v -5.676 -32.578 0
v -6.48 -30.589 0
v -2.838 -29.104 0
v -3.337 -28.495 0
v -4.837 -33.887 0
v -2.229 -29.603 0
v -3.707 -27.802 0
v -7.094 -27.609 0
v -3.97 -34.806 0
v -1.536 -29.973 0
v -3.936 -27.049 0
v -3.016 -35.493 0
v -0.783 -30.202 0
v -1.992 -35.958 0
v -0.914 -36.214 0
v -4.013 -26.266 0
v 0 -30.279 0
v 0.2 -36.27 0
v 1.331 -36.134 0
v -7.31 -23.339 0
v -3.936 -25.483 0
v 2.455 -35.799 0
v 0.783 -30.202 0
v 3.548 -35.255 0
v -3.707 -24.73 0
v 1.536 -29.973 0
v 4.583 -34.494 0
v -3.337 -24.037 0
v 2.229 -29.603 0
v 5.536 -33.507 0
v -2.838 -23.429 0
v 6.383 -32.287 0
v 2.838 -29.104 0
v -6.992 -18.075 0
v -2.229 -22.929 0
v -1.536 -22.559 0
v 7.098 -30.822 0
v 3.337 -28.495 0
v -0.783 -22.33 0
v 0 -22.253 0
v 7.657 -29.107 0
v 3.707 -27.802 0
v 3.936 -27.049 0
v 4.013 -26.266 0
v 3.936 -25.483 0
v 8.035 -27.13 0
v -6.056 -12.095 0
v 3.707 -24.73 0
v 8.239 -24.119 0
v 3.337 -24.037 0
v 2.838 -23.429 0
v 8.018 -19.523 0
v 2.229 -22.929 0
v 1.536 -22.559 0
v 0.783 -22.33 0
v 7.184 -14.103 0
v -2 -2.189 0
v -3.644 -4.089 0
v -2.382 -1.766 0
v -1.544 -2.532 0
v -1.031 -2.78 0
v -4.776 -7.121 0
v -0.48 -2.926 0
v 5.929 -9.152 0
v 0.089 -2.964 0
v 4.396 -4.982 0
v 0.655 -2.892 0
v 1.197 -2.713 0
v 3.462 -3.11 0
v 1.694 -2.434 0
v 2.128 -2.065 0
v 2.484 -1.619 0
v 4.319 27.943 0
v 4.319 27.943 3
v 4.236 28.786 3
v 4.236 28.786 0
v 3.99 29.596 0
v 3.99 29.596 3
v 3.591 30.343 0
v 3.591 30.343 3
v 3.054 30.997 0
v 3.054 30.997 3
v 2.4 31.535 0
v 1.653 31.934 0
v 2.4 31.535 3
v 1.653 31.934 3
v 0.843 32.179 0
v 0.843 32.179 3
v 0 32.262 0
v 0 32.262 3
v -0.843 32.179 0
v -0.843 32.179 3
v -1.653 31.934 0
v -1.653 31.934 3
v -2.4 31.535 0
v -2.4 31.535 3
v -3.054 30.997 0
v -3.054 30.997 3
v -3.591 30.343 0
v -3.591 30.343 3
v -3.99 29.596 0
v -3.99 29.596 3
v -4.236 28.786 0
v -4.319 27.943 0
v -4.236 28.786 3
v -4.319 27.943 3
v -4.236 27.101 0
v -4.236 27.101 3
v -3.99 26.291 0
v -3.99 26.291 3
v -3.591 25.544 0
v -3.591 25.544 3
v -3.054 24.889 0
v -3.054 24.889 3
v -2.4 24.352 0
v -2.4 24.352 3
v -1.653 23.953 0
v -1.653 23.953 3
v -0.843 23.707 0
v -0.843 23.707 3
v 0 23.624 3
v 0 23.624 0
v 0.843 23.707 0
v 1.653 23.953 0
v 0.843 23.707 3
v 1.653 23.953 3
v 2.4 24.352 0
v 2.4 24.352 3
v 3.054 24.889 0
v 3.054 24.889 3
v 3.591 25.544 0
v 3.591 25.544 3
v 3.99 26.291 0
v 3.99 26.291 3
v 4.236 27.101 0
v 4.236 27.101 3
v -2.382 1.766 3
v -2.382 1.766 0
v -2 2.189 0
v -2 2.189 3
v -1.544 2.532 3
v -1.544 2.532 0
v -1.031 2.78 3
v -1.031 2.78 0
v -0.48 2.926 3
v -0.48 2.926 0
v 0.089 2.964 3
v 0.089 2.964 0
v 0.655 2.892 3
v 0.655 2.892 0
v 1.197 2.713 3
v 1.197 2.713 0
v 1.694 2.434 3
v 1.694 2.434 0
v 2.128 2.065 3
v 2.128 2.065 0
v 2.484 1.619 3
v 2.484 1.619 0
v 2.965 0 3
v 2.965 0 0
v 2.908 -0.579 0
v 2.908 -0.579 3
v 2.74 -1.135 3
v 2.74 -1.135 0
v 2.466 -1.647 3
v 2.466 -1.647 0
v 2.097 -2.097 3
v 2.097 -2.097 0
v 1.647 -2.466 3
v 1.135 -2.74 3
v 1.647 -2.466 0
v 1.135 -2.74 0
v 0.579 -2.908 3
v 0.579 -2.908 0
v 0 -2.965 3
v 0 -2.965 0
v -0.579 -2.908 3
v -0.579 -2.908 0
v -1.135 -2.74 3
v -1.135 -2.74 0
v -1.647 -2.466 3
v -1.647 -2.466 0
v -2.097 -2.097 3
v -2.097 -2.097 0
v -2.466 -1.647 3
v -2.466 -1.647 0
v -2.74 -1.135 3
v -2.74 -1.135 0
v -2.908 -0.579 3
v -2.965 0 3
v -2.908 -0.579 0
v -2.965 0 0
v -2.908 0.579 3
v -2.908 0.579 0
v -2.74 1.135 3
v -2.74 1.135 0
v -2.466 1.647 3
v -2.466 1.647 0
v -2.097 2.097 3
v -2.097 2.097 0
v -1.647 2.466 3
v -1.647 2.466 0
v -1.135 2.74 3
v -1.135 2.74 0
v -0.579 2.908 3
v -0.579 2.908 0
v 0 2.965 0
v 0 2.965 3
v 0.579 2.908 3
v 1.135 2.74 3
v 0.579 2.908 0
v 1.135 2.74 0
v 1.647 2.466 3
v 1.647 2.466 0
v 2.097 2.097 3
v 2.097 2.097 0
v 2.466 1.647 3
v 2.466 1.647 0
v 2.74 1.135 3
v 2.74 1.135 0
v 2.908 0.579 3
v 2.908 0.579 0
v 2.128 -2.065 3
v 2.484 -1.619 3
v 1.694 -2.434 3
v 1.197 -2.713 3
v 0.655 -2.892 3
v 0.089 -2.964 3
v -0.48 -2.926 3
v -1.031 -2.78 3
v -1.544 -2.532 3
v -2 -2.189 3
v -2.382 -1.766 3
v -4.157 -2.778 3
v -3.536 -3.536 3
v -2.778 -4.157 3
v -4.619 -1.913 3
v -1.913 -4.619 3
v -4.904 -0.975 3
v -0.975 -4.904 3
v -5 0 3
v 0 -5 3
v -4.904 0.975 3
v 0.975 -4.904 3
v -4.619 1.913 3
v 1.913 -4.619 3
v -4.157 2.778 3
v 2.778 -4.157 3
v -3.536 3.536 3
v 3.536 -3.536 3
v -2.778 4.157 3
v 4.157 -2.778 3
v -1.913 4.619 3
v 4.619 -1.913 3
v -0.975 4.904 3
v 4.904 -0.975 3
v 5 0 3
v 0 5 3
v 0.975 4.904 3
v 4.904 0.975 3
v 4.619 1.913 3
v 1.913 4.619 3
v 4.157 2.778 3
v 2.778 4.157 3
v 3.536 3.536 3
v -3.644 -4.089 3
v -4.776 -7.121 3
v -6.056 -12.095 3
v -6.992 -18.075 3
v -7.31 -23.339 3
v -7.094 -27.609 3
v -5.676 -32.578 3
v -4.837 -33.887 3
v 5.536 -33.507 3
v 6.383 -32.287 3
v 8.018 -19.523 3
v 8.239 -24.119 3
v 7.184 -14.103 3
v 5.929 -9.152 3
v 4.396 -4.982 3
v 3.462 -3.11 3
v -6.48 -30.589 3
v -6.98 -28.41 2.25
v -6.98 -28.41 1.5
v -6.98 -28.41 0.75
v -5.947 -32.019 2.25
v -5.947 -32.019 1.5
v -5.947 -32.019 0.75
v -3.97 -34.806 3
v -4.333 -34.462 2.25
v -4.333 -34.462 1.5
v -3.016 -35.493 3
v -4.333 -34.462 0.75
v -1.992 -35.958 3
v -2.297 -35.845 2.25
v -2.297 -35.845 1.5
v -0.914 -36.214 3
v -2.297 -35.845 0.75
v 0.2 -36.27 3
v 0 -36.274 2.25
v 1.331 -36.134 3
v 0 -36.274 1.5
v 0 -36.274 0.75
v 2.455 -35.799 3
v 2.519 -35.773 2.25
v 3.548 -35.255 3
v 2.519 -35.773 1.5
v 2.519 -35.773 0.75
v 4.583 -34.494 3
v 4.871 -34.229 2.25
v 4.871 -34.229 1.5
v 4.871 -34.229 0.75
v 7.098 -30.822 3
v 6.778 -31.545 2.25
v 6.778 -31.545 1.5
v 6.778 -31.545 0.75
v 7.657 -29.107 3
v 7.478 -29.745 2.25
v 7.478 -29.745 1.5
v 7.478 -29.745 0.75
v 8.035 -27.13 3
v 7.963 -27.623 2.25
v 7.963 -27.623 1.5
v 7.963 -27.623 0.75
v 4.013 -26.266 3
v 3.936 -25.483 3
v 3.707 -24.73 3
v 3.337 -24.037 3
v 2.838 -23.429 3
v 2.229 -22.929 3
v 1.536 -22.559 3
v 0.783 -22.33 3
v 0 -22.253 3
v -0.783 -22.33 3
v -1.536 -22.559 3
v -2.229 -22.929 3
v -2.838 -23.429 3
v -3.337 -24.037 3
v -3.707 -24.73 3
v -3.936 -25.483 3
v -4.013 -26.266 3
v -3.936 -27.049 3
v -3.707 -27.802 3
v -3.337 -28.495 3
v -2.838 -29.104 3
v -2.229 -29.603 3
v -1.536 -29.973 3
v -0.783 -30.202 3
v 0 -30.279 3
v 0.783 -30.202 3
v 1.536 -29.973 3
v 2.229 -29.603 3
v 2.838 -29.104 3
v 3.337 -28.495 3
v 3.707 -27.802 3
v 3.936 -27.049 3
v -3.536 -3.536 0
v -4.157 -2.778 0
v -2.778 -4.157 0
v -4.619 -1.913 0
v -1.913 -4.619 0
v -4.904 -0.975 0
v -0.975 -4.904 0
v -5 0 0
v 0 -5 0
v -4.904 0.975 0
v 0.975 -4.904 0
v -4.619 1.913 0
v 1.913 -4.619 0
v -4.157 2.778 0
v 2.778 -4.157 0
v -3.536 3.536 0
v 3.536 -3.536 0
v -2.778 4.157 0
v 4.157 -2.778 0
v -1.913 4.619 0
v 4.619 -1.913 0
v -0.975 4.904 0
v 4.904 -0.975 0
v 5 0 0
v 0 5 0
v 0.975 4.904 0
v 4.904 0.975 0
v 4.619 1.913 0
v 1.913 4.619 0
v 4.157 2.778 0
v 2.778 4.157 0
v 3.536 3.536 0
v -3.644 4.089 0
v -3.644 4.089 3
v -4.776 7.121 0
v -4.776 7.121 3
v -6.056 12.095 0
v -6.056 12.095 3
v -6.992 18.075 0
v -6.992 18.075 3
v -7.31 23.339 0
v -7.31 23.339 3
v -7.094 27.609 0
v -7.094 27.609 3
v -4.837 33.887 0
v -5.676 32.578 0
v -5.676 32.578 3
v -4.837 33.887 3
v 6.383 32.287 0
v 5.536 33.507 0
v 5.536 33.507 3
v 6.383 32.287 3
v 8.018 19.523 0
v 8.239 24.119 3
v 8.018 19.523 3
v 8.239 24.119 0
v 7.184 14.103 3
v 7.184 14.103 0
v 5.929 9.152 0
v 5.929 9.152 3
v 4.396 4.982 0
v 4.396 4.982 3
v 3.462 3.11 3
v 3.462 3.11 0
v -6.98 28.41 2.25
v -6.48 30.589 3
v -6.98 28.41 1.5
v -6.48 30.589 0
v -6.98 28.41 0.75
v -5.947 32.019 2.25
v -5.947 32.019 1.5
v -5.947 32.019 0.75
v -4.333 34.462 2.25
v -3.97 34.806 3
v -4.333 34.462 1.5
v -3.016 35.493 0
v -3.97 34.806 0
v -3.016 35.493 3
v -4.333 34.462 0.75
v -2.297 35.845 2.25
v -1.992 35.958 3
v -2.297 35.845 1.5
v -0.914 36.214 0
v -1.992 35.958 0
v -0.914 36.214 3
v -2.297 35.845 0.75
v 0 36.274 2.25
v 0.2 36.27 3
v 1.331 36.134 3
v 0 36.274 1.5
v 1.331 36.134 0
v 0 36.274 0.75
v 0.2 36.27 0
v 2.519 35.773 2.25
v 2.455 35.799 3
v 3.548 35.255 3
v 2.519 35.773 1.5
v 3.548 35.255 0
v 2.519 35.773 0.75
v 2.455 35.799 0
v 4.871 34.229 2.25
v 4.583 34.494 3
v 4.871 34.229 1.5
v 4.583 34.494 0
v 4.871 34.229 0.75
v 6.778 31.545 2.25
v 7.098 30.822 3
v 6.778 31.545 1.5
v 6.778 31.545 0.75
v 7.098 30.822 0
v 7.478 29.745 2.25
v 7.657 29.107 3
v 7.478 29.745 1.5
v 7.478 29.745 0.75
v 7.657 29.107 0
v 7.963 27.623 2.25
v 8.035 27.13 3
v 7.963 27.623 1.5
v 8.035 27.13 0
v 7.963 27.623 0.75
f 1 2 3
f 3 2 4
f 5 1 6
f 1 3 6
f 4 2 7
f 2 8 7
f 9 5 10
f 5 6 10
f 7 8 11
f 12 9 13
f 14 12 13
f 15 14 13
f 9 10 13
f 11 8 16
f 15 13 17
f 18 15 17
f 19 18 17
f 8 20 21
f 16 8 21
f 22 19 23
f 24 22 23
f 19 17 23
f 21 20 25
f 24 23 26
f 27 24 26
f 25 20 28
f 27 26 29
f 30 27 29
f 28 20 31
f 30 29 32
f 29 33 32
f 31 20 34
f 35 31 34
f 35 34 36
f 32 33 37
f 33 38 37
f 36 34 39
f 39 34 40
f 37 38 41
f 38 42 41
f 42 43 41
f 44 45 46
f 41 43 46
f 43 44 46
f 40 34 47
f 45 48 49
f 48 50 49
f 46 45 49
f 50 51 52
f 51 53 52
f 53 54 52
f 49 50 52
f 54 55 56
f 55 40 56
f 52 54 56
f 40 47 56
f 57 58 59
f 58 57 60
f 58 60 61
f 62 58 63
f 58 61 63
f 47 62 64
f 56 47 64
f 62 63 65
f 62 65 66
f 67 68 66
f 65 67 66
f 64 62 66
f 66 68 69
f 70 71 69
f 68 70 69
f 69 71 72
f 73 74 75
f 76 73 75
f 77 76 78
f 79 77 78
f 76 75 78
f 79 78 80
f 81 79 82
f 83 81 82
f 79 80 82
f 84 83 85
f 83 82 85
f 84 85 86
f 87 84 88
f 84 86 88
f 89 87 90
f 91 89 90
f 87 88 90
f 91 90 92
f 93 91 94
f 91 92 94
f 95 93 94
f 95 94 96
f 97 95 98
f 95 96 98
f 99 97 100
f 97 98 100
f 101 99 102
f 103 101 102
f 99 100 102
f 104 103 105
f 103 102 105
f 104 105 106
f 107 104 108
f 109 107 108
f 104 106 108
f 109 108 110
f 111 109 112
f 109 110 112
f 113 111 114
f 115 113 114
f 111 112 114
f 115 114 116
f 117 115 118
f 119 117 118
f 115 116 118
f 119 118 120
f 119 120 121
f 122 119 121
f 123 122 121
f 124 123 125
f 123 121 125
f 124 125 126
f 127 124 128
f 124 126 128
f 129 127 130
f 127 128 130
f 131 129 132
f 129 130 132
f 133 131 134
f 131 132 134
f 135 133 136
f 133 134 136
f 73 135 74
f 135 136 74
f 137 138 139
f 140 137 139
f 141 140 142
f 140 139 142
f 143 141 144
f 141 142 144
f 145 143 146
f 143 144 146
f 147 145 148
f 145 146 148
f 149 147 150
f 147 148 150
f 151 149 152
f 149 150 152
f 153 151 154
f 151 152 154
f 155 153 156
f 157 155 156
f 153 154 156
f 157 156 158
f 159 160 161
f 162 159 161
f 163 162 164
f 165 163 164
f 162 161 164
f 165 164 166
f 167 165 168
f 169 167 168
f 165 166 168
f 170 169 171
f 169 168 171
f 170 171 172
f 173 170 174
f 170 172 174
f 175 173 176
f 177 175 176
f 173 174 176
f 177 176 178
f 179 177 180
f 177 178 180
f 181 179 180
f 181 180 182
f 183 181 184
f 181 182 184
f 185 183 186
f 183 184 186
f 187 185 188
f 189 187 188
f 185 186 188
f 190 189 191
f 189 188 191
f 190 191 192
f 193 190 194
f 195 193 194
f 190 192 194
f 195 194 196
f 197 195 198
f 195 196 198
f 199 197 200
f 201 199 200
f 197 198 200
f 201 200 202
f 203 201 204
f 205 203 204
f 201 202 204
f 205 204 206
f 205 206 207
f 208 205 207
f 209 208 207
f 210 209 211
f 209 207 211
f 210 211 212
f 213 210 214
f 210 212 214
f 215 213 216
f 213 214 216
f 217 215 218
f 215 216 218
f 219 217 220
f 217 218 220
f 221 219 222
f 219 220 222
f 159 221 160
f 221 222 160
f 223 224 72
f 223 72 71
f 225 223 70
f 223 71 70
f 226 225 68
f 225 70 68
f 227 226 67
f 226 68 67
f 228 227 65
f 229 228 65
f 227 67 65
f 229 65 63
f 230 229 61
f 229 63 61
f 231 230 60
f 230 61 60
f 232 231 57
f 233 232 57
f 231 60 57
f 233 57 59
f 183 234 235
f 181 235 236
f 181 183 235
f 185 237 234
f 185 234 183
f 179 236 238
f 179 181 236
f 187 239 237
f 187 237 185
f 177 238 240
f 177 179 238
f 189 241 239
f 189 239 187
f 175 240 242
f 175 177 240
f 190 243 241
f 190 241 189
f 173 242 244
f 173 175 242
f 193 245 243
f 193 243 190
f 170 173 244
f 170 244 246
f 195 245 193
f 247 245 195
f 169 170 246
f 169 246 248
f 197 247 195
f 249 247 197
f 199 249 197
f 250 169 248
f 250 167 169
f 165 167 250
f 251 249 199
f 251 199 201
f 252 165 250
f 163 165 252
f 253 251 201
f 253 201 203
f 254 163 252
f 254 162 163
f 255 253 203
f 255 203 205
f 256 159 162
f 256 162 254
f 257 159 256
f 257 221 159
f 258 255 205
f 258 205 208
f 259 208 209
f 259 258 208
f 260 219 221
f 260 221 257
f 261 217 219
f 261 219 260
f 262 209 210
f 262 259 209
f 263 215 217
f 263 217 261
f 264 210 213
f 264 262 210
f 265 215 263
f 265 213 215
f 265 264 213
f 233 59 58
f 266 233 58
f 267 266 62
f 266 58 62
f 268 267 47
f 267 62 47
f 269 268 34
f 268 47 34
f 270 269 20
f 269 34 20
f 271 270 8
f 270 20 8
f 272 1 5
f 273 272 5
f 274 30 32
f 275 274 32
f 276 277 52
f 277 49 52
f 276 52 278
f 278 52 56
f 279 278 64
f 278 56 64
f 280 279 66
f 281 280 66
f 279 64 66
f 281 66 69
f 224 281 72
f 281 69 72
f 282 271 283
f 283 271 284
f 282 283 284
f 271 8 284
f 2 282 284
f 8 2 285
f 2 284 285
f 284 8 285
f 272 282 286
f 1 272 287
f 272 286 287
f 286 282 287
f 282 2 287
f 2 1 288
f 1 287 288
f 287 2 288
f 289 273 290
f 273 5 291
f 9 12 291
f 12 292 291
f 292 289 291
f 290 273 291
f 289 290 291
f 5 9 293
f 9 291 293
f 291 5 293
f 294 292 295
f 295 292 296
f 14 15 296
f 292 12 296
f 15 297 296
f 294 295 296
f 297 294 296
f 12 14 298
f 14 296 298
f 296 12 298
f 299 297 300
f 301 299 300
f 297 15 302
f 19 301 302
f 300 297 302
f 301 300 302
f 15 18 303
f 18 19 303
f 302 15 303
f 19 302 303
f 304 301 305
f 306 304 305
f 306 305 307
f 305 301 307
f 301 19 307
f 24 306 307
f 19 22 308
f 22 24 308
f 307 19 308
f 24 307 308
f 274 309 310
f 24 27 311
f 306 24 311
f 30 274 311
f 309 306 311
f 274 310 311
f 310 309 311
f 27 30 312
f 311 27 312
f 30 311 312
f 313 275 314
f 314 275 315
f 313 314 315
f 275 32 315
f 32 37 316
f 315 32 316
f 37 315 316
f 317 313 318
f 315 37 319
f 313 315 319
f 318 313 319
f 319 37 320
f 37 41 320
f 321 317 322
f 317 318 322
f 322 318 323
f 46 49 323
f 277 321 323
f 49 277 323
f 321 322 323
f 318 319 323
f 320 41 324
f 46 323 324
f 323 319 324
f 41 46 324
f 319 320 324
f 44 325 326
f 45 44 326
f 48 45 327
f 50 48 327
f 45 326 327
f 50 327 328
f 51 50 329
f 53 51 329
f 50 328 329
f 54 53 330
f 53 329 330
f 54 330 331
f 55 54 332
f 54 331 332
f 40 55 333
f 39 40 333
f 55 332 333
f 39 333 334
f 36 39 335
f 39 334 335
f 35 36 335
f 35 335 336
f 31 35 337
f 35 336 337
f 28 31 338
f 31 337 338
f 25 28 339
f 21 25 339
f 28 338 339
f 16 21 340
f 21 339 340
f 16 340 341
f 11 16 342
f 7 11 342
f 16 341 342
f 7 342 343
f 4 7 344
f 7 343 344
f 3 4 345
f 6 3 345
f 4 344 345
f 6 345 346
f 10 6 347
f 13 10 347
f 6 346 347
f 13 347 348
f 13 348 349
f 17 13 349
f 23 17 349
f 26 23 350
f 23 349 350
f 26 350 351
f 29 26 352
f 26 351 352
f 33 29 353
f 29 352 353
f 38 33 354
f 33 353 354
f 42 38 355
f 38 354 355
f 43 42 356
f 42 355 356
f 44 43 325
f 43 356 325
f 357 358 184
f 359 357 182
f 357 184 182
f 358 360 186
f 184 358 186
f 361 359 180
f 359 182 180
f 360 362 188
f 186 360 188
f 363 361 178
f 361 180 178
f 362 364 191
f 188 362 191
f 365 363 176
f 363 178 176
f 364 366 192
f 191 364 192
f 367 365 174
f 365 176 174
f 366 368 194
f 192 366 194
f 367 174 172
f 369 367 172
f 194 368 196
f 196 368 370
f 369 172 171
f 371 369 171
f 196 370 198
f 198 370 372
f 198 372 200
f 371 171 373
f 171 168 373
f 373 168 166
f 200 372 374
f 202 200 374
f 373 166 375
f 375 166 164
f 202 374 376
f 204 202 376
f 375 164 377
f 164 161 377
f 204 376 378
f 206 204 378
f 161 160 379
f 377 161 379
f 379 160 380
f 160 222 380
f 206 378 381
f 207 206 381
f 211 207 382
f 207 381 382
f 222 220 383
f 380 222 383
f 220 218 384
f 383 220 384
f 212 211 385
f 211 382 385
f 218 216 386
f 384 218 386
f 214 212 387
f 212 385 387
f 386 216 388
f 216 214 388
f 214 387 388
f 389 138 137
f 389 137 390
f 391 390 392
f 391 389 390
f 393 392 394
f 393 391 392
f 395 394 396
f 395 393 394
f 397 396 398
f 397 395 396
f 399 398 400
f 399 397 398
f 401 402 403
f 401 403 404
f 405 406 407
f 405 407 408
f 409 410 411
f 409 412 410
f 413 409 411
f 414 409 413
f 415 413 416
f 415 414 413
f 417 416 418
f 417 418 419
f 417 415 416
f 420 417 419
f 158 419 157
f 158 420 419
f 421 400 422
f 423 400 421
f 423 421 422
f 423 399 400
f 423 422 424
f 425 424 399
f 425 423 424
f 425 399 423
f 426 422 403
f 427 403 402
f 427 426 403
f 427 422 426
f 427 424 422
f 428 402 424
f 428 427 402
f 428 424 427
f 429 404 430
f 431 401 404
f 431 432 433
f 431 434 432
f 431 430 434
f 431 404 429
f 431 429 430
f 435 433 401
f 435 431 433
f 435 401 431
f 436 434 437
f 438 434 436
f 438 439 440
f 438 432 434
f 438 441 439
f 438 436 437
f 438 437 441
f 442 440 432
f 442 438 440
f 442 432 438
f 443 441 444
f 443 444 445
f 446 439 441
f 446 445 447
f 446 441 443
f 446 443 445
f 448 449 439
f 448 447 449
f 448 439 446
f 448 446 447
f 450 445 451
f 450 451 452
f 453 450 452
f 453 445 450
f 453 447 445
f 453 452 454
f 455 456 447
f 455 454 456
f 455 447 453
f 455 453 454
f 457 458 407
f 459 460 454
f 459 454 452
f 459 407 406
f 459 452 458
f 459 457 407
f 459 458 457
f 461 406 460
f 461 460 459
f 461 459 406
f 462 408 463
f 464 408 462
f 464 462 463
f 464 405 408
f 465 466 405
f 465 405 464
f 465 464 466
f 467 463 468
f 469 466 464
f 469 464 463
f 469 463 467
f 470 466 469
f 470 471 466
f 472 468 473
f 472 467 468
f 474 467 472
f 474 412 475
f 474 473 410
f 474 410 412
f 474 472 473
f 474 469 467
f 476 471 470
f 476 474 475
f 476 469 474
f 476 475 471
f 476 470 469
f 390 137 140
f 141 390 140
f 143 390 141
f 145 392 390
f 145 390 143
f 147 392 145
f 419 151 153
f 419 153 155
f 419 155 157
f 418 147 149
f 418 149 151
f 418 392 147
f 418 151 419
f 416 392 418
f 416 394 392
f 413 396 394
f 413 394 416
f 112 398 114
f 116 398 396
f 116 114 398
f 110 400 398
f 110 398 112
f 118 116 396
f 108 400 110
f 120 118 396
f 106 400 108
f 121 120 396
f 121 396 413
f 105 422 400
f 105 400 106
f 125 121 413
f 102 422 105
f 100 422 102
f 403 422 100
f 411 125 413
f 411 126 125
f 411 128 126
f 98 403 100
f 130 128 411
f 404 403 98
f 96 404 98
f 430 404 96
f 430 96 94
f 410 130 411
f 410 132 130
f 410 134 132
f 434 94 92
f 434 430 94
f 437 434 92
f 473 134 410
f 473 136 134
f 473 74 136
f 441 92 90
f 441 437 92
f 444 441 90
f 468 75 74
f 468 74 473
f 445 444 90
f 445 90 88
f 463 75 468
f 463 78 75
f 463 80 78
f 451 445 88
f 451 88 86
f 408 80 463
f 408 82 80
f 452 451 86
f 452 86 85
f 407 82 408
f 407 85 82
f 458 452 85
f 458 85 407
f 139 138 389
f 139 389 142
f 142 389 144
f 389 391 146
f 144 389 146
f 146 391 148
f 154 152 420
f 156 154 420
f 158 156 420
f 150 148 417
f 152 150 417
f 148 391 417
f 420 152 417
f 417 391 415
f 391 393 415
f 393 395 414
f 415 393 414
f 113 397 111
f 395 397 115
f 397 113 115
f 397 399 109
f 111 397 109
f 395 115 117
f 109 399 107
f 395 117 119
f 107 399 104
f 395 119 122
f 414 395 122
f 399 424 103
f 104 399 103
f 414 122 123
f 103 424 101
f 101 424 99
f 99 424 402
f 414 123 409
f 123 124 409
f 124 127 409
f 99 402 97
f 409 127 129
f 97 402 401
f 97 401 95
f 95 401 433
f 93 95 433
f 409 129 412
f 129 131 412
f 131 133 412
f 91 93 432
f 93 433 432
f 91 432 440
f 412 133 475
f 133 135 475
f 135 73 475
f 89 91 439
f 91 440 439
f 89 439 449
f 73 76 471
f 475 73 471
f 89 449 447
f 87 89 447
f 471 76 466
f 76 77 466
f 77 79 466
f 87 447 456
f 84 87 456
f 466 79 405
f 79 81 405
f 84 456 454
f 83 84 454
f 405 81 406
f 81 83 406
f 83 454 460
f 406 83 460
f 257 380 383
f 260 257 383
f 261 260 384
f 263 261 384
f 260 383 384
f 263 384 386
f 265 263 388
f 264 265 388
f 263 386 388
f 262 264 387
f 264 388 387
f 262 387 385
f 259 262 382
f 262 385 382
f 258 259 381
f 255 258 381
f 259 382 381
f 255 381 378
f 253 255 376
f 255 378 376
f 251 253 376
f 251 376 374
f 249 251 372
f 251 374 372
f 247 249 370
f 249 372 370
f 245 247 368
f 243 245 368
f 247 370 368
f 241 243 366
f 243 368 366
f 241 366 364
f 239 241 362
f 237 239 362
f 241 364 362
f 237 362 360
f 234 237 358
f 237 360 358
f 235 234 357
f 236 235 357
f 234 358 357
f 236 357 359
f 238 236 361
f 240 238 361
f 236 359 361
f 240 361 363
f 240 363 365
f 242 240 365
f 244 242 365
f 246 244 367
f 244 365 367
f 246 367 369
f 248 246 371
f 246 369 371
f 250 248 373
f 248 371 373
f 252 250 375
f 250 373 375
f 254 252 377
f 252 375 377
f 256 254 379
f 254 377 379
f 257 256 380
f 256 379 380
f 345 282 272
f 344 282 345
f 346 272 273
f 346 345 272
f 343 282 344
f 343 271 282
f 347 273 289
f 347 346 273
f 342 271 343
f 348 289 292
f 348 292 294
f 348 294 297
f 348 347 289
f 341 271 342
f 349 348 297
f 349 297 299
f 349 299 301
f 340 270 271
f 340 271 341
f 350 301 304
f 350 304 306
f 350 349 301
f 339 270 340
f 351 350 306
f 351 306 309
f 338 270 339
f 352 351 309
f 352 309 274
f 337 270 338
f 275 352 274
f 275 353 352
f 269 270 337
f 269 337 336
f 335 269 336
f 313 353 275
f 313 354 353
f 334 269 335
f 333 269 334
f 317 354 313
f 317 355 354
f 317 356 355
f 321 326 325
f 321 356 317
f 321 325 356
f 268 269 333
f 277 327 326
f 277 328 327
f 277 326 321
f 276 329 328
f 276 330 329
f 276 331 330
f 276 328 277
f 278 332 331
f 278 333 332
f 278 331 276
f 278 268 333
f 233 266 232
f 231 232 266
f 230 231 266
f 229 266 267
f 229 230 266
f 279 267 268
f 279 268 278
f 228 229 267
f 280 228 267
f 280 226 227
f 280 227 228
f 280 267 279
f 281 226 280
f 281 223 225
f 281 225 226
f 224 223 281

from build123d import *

# Parameters (mm, degrees)
F0_R     = 5
F2_DEPTH = 3
F3_R     = 2.9654149604
F4_DEPTH = 3
F5_R     = 4.3190481717
F6_DEPTH = 3
F7_R     = 4.0128846503
F8_DEPTH = 3


with BuildPart() as f2:
    # F0 (on Top) → F2 (new body)
    with BuildSketch(Plane.XY):
        Circle(F0_R)
    extrude(amount=F2_DEPTH)


with BuildPart() as f2b:
    # F1 (on face) → F2, piece 2 (new body)
    with BuildSketch(Plane.XY):
        with BuildLine():
            Line((0.1082780632, 0), (0, 0))
            add(Edge.make_bspline(
                [(0.1082780632, 0), (0.0721539391, -0.0011811757), (0.0360600267, -0.0011858813), (0, 0)],
                knots=[0.9975261926, 0.9975261926, 0.9975261926, 0.9975261926, 1, 1, 1, 1], degree=3))
        make_face()
        with BuildLine():
            add(Edge.make_bspline(
                [(0.1082780632, 0), (0.0721539391, 0.0011811757), (0.0360600267, 0.0011858813), (0, 0)],
                knots=[0.9975261926, 0.9975261926, 0.9975261926, 0.9975261926, 1, 1, 1, 1], degree=3))
            Line((0, 0), (0.1082780632, 0))
        make_face()
        with BuildLine():
            add(Edge.make_bspline(
                [(0.1082780632, 0), (0.0721539391, -0.0011811757), (0.0360600267, -0.0011858813), (0, 0)],
                knots=[0.9975261926, 0.9975261926, 0.9975261926, 0.9975261926, 1, 1, 1, 1], degree=3))
            add(Edge.make_bspline(
                [(0, 0), (-4.5202198092, -0.1486533614), (-10.8987291902, -30.310312004), (-0.0988943112, -38.6586537279), (12.639483903, -29.7840963528), (4.5610384466, -0.1455950163), (0.1082780632, 0)],
                knots=[0, 0, 0, 0, 0.3100983062, 0.4960086427, 0.6925977866, 0.9975261926, 0.9975261926, 0.9975261926, 0.9975261926], degree=3))
        make_face()
        with BuildLine():
            add(Edge.make_bspline(
                [(0, 0), (-4.5202198092, 0.1486533614), (-10.8987291902, 30.310312004), (-0.0988943112, 38.6586537279), (12.639483903, 29.7840963528), (4.5610384466, 0.1455950163), (0.1082780632, 0)],
                knots=[0, 0, 0, 0, 0.3100983062, 0.4960086427, 0.6925977866, 0.9975261926, 0.9975261926, 0.9975261926, 0.9975261926], degree=3))
            add(Edge.make_bspline(
                [(0.1082780632, 0), (0.0721539391, 0.0011811757), (0.0360600267, 0.0011858813), (0, 0)],
                knots=[0.9975261926, 0.9975261926, 0.9975261926, 0.9975261926, 1, 1, 1, 1], degree=3))
        make_face()
    extrude(amount=F2_DEPTH)


with BuildPart() as f4_tool:
    # F3 (on face) → F4 (new body)
    with BuildSketch(Plane(origin=(0, 0, 0), x_dir=(1, 0, 0), z_dir=(0, 0, -1))):
        Circle(F3_R)
    extrude(amount=-F4_DEPTH)


with BuildPart() as f2_1:
    add(f2.part)

    # F4: cut by f4_tool
    add(f4_tool.part, mode=Mode.SUBTRACT)


with BuildPart() as f2b_1:
    add(f2b.part)

    # F4: cut by f4_tool
    add(f4_tool.part, mode=Mode.SUBTRACT)

    # F5 (on face) → F6 (cut)
    with BuildSketch(Plane.XY.offset(3)):
        with Locations((0, 27.943385765)):
            Circle(F5_R)
    extrude(amount=-F6_DEPTH, mode=Mode.SUBTRACT)

    # F7 (on face) → F8 (cut)
    with BuildSketch(Plane.XY.offset(3)):
        with Locations((0, -26.2660551816)):
            Circle(F7_R)
    extrude(amount=-F8_DEPTH, mode=Mode.SUBTRACT)


solid = Compound([f2_1.part, f2b_1.part])
